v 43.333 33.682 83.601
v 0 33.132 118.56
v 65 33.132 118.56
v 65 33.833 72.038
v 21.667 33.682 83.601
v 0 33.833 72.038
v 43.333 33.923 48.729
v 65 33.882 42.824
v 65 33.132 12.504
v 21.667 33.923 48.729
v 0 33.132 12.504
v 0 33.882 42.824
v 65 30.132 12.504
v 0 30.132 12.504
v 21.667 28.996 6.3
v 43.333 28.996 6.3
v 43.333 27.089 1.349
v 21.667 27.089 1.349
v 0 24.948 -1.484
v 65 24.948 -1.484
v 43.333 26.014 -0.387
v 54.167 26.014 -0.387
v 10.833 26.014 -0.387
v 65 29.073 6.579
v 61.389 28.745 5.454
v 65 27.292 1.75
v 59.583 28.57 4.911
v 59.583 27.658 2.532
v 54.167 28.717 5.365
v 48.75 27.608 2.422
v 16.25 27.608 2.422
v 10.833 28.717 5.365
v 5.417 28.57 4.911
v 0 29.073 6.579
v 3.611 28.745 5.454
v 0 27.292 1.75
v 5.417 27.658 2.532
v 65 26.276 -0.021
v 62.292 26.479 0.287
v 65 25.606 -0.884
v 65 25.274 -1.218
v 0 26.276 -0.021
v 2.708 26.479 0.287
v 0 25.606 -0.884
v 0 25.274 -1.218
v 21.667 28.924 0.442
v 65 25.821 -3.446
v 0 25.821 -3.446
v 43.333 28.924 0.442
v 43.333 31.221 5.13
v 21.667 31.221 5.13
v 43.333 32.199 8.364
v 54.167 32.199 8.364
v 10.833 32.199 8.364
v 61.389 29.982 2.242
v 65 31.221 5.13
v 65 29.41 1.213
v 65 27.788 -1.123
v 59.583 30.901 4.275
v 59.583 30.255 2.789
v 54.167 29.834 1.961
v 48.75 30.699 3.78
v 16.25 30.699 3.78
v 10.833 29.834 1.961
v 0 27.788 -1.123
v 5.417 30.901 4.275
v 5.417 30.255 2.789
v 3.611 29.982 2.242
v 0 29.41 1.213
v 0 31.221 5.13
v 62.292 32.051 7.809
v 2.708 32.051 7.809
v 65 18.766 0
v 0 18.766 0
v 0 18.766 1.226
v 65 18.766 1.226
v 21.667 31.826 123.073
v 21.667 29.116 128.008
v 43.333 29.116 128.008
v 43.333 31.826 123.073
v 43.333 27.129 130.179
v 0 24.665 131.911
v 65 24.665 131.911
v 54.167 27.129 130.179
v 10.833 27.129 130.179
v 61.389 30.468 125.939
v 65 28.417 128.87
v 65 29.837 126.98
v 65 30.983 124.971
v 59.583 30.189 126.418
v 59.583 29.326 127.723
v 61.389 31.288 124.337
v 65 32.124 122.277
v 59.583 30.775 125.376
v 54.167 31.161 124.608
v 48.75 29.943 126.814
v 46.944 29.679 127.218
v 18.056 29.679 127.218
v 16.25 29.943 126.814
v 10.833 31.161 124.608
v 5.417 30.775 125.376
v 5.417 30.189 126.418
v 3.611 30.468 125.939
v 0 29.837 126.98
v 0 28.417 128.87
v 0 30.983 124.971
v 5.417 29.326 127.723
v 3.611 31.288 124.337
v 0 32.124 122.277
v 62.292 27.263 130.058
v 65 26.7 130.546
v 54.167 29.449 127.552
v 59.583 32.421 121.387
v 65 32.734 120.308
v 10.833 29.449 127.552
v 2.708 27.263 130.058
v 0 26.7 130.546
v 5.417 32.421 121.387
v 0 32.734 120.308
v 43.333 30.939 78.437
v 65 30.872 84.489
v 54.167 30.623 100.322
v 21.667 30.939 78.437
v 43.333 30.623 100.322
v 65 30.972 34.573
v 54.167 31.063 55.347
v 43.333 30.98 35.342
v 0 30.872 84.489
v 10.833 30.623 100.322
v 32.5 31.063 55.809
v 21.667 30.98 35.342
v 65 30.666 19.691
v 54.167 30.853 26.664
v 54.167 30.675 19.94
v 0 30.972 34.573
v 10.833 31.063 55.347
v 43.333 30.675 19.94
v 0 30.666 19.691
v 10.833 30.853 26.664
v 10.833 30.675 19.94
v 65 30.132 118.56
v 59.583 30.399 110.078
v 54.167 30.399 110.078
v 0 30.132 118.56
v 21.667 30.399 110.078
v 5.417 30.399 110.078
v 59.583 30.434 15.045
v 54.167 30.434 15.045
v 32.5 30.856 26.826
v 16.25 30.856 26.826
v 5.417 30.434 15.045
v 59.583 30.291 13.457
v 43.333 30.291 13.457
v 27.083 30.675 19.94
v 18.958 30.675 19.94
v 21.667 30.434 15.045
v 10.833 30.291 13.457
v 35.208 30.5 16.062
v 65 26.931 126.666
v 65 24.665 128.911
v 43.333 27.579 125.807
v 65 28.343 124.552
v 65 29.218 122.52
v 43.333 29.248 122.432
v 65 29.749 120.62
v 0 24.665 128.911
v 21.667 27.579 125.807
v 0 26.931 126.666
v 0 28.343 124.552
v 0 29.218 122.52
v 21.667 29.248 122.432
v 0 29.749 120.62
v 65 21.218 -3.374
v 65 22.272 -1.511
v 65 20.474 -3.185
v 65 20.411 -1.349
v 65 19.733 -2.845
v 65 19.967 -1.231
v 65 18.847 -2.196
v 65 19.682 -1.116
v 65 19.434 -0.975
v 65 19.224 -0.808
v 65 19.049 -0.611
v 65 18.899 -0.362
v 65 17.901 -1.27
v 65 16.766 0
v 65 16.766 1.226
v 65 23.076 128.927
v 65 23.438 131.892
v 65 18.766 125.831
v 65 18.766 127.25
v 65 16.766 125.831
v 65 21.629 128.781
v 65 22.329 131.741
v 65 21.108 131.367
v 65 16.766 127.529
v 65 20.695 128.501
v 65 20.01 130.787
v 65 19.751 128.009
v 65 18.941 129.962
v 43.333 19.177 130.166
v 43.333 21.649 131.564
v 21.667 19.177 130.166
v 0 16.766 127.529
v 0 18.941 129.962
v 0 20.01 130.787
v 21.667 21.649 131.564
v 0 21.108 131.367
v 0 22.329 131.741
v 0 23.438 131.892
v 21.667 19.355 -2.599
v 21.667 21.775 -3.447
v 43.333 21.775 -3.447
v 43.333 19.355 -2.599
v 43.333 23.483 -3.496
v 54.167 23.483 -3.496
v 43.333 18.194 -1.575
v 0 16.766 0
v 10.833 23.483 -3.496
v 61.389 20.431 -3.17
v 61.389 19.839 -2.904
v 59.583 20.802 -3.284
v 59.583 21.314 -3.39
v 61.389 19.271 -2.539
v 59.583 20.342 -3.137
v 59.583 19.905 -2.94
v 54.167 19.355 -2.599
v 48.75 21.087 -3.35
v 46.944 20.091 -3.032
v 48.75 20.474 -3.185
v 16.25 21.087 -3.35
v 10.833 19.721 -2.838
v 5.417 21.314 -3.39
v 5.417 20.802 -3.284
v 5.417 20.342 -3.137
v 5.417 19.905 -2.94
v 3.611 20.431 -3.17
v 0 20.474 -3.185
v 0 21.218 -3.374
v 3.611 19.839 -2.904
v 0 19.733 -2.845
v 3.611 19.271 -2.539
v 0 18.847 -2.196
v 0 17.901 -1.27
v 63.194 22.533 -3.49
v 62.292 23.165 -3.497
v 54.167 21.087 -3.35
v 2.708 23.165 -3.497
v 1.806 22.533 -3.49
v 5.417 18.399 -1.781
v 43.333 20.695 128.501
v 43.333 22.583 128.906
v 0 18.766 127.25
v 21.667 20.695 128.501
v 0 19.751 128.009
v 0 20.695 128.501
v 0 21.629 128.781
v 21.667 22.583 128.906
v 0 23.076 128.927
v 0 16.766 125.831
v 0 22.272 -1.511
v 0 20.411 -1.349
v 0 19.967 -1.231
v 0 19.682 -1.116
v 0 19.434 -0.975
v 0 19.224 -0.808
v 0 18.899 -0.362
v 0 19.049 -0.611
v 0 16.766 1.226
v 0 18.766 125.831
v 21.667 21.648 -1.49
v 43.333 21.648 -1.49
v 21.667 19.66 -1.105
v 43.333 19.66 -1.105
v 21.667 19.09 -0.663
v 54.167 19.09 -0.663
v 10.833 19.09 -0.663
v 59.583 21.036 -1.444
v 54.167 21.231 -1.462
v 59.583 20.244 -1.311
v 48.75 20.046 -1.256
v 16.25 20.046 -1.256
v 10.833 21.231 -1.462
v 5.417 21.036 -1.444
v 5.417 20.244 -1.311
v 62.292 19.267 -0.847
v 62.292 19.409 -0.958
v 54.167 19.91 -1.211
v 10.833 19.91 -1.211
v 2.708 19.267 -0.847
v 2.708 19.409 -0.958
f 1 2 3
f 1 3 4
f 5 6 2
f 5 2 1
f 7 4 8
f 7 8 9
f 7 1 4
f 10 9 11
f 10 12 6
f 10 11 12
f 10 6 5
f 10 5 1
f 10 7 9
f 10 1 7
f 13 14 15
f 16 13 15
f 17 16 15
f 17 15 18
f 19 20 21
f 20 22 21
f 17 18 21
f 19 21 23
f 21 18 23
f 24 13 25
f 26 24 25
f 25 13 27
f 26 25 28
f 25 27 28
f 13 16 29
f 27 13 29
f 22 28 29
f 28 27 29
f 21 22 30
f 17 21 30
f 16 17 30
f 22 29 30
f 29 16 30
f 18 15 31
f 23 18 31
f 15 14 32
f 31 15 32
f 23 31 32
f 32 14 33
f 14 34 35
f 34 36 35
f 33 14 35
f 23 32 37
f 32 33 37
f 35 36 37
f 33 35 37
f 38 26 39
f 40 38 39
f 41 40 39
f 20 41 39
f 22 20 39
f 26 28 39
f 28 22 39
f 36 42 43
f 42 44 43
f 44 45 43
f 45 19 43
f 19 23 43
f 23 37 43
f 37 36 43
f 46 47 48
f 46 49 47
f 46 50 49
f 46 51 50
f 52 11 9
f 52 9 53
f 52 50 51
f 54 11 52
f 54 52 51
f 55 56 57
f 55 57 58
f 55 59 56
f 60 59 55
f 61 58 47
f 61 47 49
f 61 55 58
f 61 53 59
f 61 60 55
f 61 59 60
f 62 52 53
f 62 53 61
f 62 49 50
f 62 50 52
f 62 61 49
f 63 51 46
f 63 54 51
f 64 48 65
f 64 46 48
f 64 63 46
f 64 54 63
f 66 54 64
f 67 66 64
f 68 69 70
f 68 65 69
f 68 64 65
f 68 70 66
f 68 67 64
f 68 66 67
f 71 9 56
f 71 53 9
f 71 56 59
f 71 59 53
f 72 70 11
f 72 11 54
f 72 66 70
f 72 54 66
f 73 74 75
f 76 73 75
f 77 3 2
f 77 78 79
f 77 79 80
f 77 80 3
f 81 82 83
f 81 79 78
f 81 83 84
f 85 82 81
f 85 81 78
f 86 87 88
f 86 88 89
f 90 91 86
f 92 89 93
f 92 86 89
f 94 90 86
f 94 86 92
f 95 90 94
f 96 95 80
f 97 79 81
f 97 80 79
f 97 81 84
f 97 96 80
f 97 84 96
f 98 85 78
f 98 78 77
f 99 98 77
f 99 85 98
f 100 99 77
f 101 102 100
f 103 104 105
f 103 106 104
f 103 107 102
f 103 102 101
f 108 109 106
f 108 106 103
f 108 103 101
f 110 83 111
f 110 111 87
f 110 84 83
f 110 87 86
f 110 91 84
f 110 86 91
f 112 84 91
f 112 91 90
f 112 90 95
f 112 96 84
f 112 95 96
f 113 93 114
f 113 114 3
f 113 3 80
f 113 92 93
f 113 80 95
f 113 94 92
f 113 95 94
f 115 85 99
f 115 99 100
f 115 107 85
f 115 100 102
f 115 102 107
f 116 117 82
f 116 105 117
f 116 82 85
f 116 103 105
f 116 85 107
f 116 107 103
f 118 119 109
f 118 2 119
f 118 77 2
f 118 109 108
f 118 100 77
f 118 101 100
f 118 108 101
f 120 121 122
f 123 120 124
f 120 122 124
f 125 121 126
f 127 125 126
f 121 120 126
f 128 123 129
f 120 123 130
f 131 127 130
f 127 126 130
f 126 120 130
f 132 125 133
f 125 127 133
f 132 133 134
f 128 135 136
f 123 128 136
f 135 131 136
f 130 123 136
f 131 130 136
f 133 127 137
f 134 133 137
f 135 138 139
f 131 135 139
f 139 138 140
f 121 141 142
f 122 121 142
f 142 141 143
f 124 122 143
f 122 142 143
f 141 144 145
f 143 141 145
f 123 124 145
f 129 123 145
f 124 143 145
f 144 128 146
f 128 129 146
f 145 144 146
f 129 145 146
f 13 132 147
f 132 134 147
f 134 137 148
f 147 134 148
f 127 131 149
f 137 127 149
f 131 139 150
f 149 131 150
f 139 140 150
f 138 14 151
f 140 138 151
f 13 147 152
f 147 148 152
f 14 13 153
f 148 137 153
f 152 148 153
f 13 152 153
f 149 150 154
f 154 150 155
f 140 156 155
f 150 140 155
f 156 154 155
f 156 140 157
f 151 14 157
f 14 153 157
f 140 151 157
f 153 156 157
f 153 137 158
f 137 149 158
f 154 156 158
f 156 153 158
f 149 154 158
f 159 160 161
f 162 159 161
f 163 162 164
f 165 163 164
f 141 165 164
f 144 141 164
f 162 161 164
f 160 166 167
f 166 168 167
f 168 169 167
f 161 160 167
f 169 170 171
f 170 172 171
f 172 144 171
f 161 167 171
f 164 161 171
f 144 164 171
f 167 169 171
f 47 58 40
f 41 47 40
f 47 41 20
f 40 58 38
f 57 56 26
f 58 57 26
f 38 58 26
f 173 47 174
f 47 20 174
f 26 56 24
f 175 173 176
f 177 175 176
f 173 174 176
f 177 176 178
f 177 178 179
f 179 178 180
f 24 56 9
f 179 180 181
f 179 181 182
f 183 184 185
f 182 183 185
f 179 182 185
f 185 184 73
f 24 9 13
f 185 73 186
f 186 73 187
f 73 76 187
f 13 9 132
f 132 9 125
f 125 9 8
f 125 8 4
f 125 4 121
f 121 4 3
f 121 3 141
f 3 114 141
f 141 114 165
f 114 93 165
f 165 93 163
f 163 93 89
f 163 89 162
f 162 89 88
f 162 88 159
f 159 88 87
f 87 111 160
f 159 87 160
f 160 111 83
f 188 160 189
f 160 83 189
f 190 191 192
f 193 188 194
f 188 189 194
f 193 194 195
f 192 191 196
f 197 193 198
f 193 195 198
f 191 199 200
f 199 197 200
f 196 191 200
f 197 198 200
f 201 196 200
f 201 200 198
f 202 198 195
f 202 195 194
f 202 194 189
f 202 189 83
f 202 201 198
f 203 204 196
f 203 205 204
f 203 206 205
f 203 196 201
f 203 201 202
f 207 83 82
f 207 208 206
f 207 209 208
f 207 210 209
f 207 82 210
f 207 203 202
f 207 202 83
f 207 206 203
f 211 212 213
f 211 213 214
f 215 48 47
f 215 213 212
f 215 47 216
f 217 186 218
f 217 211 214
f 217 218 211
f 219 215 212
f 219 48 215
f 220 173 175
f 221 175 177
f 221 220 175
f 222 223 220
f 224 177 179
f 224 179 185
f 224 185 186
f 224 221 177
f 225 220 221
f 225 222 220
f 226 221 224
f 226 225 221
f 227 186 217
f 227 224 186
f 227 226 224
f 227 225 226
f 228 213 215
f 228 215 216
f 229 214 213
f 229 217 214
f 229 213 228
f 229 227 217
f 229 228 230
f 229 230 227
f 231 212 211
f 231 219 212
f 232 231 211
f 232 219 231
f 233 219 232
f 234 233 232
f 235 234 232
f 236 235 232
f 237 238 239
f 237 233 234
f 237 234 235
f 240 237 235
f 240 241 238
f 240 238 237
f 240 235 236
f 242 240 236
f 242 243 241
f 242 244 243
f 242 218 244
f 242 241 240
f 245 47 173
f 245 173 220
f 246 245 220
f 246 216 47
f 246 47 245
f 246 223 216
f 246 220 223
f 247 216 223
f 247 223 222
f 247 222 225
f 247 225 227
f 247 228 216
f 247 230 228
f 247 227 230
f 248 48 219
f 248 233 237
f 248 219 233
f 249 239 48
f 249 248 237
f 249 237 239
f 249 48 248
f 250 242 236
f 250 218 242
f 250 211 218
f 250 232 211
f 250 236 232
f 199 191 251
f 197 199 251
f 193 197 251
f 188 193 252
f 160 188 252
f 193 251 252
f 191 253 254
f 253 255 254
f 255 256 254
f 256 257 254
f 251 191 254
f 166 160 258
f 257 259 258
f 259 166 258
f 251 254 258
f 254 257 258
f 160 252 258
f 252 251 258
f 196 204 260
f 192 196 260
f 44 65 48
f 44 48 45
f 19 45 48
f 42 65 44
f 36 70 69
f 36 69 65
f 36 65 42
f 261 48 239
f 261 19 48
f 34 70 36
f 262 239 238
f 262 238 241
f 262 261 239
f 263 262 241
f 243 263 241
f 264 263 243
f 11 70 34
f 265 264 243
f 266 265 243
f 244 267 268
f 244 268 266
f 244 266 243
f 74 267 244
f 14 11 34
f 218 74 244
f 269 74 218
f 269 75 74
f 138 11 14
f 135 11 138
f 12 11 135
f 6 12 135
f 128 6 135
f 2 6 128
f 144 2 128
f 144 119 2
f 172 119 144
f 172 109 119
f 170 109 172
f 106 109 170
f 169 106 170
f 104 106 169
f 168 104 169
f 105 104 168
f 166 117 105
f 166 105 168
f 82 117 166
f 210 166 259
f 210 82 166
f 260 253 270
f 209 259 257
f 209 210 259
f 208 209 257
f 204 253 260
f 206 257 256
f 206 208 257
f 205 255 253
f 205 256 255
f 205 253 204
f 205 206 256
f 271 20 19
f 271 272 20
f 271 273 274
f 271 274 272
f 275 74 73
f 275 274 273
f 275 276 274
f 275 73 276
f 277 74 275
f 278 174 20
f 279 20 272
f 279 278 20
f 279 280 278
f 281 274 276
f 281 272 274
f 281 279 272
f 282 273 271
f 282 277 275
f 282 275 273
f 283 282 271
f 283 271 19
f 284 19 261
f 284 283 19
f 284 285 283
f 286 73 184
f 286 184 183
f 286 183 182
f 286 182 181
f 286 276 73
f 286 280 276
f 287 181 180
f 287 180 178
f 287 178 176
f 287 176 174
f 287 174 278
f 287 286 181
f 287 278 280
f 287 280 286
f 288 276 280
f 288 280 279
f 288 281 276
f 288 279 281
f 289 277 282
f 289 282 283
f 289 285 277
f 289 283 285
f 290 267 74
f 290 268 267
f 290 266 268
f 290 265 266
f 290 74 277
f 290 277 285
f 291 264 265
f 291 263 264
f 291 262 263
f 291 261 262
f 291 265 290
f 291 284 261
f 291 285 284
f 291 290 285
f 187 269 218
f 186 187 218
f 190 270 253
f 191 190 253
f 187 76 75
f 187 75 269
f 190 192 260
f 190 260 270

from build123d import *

# Parameters (mm, degrees)
F1_DEPTH = 65


# Not quite as in the source:
# - a feature of the source that left no trace in its solid (it failed there, or was rolled back) is left out


with BuildPart() as f1:
    # F0 (on Right) → F1 (new body)
    with BuildSketch(Plane.YZ):
        with BuildLine():
            add(Edge.make_bspline(
                [(18.7661014497, 0), (19.1870545514, -1.5757839415), (20.9180506756, -1.5757839415), (24.9482551811, -1.4842043442)],
                knots=[0, 0, 0, 0, 6.3578209548, 6.3578209548, 6.3578209548, 6.3578209548], degree=3))
            Line((18.7661014497, 0), (18.7661014497, 1.2257922208))
            Line((18.7661014497, 1.2257922208), (16.7661014497, 1.2257922208))
            Line((16.7661014497, 1.2257922208), (16.7661014497, 0))
            add(Edge.make_bspline(
                [(25.8208457381, -3.4455822315), (20.3640181571, -3.5696015693), (20.0367699781, -3.7762995344), (16.7661014497, 0)],
                knots=[0, 0, 0, 0, 9.6881593216, 9.6881593216, 9.6881593216, 9.6881593216], degree=3))
            add(Edge.make_bspline(
                [(33.1323030144, 12.5043019652), (31.2740066807, 3.1586566474), (29.4667687267, 0.669103465), (25.8208457381, -3.4455822315)],
                knots=[0, 0, 0, 0, 17.5458317954, 17.5458317954, 17.5458317954, 17.5458317954], degree=3))
            add(Edge.make_bspline(
                [(33.1323030144, 118.5604482889), (33.596022293, 83.0767303705), (34.6795393378, 49.8848743737), (33.1323030144, 12.5043019652)],
                knots=[0, 0, 0, 0, 106.0561463237, 106.0561463237, 106.0561463237, 106.0561463237], degree=3))
            add(Edge.make_bspline(
                [(24.665299803, 131.9109736681), (30.0977956504, 129.0076056719), (32.4164180309, 122.3780736327), (33.1323030144, 118.5604482889)],
                knots=[0, 0, 0, 0, 15.8090692731, 15.8090692731, 15.8090692731, 15.8090692731], degree=3))
            add(Edge.make_bspline(
                [(16.7661014497, 127.5289058685), (19.3061102182, 130.8498382568), (21.2166272104, 132.0254335403), (24.665299803, 131.9109736681)],
                knots=[0, 0, 0, 0, 9.0332636862, 9.0332636862, 9.0332636862, 9.0332636862], degree=3))
            Line((16.7661014497, 127.5289058685), (16.7661014497, 125.8308589458))
            Line((16.7661014497, 125.8308589458), (18.7661014497, 125.8308589458))
            Line((18.7661014497, 125.8308589458), (18.7661014497, 127.25))
            add(Edge.make_bspline(
                [(18.7661014497, 127.25), (20.7947045565, 129.0723085403), (22.4061720073, 128.9570778608), (24.665299803, 128.9109736681)],
                knots=[0, 0, 0, 0, 6.1285703665, 6.1285703665, 6.1285703665, 6.1285703665], degree=3))
            add(Edge.make_bspline(
                [(24.665299803, 128.9109736681), (28.353670612, 125.8680671453), (29.4868368655, 122.7559670806), (30.1323030144, 118.5604482889)],
                knots=[0, 0, 0, 0, 11.705618298, 11.705618298, 11.705618298, 11.705618298], degree=3))
            add(Edge.make_bspline(
                [(30.1323030144, 118.5604482889), (31.2795434147, 87.6652374864), (31.466094777, 17.4715379253), (30.1323030144, 12.5043019652)],
                knots=[0, 0, 0, 0, 106.0561463237, 106.0561463237, 106.0561463237, 106.0561463237], degree=3))
            add(Edge.make_bspline(
                [(30.1323030144, 12.5043019652), (29.5598134398, 5.9633483179), (27.0264066677, 0), (24.9482551811, -1.4842043442)],
                knots=[0, 0, 0, 0, 14.9181989766, 14.9181989766, 14.9181989766, 14.9181989766], degree=3))
        make_face()
    extrude(amount=F1_DEPTH)


solid = f1.part
